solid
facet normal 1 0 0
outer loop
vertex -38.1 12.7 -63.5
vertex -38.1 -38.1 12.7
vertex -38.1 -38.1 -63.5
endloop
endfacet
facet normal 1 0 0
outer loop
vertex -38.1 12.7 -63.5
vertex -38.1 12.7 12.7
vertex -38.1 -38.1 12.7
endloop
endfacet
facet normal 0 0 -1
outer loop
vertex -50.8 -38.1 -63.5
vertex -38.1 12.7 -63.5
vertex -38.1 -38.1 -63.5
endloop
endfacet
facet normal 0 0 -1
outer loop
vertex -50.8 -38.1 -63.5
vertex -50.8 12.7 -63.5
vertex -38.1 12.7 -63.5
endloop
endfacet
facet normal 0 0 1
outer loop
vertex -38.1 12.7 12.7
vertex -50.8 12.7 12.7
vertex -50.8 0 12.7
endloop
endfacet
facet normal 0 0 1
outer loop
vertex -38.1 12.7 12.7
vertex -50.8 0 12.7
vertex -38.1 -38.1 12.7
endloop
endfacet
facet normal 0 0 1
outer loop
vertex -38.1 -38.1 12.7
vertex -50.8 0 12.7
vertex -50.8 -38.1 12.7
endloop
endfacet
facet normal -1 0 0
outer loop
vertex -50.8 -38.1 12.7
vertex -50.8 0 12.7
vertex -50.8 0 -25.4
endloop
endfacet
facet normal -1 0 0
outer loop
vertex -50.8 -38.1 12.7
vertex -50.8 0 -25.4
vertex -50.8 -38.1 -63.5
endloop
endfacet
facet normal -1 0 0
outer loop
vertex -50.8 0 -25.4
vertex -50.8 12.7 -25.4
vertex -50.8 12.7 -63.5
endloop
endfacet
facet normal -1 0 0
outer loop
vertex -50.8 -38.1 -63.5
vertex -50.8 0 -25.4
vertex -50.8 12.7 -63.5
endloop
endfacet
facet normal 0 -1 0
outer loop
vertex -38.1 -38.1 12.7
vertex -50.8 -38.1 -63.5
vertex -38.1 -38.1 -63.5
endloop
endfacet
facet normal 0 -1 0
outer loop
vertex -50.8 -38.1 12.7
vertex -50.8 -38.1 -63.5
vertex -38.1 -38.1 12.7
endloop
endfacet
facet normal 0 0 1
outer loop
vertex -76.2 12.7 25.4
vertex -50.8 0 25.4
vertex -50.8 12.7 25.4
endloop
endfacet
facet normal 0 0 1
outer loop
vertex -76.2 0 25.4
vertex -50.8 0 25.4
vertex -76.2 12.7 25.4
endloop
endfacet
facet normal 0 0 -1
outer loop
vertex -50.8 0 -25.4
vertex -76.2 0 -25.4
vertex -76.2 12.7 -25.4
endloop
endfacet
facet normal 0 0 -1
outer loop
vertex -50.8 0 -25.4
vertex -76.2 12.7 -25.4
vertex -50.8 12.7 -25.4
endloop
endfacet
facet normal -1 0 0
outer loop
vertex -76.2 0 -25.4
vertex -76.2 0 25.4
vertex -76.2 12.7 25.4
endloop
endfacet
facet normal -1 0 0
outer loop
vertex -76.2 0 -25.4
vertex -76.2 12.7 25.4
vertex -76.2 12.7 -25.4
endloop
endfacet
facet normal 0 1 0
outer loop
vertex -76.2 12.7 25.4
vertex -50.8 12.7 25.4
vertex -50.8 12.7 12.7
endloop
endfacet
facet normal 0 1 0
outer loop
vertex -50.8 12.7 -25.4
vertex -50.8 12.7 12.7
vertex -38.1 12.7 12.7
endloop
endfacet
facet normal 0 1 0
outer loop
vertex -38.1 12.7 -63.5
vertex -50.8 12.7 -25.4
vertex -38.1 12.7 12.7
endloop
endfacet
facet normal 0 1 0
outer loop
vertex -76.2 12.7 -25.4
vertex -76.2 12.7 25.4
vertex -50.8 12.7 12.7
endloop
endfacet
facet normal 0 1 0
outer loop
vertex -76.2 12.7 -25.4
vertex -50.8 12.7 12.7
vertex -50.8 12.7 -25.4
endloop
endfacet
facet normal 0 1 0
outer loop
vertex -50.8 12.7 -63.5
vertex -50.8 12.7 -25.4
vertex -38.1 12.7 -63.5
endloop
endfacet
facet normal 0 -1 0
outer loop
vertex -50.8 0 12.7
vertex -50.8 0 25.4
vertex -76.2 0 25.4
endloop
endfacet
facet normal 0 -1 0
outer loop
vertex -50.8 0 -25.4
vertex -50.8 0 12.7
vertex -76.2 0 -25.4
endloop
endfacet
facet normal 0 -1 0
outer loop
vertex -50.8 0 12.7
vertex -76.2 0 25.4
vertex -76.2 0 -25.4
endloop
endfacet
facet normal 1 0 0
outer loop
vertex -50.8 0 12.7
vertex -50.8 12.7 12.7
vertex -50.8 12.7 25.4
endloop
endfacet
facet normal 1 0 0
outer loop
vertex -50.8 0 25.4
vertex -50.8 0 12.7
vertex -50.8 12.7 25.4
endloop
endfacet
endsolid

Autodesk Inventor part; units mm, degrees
ref_plane "YZ Plane" through (0, 0, 0) normal (1, 0, 0) x (0, 1, 0)
ref_plane "XZ Plane" through (0, 0, 0) normal (0, 1, 0) x (-1, 0, 0)
ref_plane "XY Plane" through (0, 0, 0) normal (0, 0, 1) x (1, 0, 0)
sketch "Sketch1" plane through (0, 0, 0) normal (0, 1, 0) x (-1, 0, 0)
  line L0 (0, 0) -> (50.8, 0)
  line L1 (50.8, 0) -> (50.8, -25.4)
  line L2 (50.8, -25.4) -> (0, -25.4)
  line L3 (0, -25.4) -> (0, 0)
  dimension "d0" = 50.8
  dimension "d1" = 25.4
  dimension "d2" = 50.8
  dimension "d3" = 90
extrude "Extrusion1" add sketch "Sketch1" along normal blind 12.7
sketch "Sketch2" plane through (0, 0, -25.4) normal (0, 0, -1) x (-1, 0, 0)
  line L0 (0, 12.7) -> (50.8, 12.7) projected
  line L1 (50.8, 12.7) -> (12.7, 12.7)
  line L2 (12.7, 12.7) -> (12.7, -76.2)
  line L3 (12.7, 12.7) -> (88.9, 12.7)
  line L4 (88.9, 12.7) -> (88.9, -38.1)
  line L5 (88.9, -38.1) -> (12.7, -38.1)
  line L6 (12.7, -38.1) -> (12.7, 12.7)
  point P0 (0, 0)
  point P1 (12.7, -38.1)
  dimension "d11" = 76.2
  dimension "d12" = 50.8
extrude "Extrusion2" add sketch "Sketch2" along normal blind 12.7
move or copy body "Move Body1" bodies to move or copy 1 copy no rotation origin (0, 0, 0) rotation axis (0, 1, 0) rotation angle -90 translate (-76.2, 0, 25.4)
properties part number "wobble goal arm"
